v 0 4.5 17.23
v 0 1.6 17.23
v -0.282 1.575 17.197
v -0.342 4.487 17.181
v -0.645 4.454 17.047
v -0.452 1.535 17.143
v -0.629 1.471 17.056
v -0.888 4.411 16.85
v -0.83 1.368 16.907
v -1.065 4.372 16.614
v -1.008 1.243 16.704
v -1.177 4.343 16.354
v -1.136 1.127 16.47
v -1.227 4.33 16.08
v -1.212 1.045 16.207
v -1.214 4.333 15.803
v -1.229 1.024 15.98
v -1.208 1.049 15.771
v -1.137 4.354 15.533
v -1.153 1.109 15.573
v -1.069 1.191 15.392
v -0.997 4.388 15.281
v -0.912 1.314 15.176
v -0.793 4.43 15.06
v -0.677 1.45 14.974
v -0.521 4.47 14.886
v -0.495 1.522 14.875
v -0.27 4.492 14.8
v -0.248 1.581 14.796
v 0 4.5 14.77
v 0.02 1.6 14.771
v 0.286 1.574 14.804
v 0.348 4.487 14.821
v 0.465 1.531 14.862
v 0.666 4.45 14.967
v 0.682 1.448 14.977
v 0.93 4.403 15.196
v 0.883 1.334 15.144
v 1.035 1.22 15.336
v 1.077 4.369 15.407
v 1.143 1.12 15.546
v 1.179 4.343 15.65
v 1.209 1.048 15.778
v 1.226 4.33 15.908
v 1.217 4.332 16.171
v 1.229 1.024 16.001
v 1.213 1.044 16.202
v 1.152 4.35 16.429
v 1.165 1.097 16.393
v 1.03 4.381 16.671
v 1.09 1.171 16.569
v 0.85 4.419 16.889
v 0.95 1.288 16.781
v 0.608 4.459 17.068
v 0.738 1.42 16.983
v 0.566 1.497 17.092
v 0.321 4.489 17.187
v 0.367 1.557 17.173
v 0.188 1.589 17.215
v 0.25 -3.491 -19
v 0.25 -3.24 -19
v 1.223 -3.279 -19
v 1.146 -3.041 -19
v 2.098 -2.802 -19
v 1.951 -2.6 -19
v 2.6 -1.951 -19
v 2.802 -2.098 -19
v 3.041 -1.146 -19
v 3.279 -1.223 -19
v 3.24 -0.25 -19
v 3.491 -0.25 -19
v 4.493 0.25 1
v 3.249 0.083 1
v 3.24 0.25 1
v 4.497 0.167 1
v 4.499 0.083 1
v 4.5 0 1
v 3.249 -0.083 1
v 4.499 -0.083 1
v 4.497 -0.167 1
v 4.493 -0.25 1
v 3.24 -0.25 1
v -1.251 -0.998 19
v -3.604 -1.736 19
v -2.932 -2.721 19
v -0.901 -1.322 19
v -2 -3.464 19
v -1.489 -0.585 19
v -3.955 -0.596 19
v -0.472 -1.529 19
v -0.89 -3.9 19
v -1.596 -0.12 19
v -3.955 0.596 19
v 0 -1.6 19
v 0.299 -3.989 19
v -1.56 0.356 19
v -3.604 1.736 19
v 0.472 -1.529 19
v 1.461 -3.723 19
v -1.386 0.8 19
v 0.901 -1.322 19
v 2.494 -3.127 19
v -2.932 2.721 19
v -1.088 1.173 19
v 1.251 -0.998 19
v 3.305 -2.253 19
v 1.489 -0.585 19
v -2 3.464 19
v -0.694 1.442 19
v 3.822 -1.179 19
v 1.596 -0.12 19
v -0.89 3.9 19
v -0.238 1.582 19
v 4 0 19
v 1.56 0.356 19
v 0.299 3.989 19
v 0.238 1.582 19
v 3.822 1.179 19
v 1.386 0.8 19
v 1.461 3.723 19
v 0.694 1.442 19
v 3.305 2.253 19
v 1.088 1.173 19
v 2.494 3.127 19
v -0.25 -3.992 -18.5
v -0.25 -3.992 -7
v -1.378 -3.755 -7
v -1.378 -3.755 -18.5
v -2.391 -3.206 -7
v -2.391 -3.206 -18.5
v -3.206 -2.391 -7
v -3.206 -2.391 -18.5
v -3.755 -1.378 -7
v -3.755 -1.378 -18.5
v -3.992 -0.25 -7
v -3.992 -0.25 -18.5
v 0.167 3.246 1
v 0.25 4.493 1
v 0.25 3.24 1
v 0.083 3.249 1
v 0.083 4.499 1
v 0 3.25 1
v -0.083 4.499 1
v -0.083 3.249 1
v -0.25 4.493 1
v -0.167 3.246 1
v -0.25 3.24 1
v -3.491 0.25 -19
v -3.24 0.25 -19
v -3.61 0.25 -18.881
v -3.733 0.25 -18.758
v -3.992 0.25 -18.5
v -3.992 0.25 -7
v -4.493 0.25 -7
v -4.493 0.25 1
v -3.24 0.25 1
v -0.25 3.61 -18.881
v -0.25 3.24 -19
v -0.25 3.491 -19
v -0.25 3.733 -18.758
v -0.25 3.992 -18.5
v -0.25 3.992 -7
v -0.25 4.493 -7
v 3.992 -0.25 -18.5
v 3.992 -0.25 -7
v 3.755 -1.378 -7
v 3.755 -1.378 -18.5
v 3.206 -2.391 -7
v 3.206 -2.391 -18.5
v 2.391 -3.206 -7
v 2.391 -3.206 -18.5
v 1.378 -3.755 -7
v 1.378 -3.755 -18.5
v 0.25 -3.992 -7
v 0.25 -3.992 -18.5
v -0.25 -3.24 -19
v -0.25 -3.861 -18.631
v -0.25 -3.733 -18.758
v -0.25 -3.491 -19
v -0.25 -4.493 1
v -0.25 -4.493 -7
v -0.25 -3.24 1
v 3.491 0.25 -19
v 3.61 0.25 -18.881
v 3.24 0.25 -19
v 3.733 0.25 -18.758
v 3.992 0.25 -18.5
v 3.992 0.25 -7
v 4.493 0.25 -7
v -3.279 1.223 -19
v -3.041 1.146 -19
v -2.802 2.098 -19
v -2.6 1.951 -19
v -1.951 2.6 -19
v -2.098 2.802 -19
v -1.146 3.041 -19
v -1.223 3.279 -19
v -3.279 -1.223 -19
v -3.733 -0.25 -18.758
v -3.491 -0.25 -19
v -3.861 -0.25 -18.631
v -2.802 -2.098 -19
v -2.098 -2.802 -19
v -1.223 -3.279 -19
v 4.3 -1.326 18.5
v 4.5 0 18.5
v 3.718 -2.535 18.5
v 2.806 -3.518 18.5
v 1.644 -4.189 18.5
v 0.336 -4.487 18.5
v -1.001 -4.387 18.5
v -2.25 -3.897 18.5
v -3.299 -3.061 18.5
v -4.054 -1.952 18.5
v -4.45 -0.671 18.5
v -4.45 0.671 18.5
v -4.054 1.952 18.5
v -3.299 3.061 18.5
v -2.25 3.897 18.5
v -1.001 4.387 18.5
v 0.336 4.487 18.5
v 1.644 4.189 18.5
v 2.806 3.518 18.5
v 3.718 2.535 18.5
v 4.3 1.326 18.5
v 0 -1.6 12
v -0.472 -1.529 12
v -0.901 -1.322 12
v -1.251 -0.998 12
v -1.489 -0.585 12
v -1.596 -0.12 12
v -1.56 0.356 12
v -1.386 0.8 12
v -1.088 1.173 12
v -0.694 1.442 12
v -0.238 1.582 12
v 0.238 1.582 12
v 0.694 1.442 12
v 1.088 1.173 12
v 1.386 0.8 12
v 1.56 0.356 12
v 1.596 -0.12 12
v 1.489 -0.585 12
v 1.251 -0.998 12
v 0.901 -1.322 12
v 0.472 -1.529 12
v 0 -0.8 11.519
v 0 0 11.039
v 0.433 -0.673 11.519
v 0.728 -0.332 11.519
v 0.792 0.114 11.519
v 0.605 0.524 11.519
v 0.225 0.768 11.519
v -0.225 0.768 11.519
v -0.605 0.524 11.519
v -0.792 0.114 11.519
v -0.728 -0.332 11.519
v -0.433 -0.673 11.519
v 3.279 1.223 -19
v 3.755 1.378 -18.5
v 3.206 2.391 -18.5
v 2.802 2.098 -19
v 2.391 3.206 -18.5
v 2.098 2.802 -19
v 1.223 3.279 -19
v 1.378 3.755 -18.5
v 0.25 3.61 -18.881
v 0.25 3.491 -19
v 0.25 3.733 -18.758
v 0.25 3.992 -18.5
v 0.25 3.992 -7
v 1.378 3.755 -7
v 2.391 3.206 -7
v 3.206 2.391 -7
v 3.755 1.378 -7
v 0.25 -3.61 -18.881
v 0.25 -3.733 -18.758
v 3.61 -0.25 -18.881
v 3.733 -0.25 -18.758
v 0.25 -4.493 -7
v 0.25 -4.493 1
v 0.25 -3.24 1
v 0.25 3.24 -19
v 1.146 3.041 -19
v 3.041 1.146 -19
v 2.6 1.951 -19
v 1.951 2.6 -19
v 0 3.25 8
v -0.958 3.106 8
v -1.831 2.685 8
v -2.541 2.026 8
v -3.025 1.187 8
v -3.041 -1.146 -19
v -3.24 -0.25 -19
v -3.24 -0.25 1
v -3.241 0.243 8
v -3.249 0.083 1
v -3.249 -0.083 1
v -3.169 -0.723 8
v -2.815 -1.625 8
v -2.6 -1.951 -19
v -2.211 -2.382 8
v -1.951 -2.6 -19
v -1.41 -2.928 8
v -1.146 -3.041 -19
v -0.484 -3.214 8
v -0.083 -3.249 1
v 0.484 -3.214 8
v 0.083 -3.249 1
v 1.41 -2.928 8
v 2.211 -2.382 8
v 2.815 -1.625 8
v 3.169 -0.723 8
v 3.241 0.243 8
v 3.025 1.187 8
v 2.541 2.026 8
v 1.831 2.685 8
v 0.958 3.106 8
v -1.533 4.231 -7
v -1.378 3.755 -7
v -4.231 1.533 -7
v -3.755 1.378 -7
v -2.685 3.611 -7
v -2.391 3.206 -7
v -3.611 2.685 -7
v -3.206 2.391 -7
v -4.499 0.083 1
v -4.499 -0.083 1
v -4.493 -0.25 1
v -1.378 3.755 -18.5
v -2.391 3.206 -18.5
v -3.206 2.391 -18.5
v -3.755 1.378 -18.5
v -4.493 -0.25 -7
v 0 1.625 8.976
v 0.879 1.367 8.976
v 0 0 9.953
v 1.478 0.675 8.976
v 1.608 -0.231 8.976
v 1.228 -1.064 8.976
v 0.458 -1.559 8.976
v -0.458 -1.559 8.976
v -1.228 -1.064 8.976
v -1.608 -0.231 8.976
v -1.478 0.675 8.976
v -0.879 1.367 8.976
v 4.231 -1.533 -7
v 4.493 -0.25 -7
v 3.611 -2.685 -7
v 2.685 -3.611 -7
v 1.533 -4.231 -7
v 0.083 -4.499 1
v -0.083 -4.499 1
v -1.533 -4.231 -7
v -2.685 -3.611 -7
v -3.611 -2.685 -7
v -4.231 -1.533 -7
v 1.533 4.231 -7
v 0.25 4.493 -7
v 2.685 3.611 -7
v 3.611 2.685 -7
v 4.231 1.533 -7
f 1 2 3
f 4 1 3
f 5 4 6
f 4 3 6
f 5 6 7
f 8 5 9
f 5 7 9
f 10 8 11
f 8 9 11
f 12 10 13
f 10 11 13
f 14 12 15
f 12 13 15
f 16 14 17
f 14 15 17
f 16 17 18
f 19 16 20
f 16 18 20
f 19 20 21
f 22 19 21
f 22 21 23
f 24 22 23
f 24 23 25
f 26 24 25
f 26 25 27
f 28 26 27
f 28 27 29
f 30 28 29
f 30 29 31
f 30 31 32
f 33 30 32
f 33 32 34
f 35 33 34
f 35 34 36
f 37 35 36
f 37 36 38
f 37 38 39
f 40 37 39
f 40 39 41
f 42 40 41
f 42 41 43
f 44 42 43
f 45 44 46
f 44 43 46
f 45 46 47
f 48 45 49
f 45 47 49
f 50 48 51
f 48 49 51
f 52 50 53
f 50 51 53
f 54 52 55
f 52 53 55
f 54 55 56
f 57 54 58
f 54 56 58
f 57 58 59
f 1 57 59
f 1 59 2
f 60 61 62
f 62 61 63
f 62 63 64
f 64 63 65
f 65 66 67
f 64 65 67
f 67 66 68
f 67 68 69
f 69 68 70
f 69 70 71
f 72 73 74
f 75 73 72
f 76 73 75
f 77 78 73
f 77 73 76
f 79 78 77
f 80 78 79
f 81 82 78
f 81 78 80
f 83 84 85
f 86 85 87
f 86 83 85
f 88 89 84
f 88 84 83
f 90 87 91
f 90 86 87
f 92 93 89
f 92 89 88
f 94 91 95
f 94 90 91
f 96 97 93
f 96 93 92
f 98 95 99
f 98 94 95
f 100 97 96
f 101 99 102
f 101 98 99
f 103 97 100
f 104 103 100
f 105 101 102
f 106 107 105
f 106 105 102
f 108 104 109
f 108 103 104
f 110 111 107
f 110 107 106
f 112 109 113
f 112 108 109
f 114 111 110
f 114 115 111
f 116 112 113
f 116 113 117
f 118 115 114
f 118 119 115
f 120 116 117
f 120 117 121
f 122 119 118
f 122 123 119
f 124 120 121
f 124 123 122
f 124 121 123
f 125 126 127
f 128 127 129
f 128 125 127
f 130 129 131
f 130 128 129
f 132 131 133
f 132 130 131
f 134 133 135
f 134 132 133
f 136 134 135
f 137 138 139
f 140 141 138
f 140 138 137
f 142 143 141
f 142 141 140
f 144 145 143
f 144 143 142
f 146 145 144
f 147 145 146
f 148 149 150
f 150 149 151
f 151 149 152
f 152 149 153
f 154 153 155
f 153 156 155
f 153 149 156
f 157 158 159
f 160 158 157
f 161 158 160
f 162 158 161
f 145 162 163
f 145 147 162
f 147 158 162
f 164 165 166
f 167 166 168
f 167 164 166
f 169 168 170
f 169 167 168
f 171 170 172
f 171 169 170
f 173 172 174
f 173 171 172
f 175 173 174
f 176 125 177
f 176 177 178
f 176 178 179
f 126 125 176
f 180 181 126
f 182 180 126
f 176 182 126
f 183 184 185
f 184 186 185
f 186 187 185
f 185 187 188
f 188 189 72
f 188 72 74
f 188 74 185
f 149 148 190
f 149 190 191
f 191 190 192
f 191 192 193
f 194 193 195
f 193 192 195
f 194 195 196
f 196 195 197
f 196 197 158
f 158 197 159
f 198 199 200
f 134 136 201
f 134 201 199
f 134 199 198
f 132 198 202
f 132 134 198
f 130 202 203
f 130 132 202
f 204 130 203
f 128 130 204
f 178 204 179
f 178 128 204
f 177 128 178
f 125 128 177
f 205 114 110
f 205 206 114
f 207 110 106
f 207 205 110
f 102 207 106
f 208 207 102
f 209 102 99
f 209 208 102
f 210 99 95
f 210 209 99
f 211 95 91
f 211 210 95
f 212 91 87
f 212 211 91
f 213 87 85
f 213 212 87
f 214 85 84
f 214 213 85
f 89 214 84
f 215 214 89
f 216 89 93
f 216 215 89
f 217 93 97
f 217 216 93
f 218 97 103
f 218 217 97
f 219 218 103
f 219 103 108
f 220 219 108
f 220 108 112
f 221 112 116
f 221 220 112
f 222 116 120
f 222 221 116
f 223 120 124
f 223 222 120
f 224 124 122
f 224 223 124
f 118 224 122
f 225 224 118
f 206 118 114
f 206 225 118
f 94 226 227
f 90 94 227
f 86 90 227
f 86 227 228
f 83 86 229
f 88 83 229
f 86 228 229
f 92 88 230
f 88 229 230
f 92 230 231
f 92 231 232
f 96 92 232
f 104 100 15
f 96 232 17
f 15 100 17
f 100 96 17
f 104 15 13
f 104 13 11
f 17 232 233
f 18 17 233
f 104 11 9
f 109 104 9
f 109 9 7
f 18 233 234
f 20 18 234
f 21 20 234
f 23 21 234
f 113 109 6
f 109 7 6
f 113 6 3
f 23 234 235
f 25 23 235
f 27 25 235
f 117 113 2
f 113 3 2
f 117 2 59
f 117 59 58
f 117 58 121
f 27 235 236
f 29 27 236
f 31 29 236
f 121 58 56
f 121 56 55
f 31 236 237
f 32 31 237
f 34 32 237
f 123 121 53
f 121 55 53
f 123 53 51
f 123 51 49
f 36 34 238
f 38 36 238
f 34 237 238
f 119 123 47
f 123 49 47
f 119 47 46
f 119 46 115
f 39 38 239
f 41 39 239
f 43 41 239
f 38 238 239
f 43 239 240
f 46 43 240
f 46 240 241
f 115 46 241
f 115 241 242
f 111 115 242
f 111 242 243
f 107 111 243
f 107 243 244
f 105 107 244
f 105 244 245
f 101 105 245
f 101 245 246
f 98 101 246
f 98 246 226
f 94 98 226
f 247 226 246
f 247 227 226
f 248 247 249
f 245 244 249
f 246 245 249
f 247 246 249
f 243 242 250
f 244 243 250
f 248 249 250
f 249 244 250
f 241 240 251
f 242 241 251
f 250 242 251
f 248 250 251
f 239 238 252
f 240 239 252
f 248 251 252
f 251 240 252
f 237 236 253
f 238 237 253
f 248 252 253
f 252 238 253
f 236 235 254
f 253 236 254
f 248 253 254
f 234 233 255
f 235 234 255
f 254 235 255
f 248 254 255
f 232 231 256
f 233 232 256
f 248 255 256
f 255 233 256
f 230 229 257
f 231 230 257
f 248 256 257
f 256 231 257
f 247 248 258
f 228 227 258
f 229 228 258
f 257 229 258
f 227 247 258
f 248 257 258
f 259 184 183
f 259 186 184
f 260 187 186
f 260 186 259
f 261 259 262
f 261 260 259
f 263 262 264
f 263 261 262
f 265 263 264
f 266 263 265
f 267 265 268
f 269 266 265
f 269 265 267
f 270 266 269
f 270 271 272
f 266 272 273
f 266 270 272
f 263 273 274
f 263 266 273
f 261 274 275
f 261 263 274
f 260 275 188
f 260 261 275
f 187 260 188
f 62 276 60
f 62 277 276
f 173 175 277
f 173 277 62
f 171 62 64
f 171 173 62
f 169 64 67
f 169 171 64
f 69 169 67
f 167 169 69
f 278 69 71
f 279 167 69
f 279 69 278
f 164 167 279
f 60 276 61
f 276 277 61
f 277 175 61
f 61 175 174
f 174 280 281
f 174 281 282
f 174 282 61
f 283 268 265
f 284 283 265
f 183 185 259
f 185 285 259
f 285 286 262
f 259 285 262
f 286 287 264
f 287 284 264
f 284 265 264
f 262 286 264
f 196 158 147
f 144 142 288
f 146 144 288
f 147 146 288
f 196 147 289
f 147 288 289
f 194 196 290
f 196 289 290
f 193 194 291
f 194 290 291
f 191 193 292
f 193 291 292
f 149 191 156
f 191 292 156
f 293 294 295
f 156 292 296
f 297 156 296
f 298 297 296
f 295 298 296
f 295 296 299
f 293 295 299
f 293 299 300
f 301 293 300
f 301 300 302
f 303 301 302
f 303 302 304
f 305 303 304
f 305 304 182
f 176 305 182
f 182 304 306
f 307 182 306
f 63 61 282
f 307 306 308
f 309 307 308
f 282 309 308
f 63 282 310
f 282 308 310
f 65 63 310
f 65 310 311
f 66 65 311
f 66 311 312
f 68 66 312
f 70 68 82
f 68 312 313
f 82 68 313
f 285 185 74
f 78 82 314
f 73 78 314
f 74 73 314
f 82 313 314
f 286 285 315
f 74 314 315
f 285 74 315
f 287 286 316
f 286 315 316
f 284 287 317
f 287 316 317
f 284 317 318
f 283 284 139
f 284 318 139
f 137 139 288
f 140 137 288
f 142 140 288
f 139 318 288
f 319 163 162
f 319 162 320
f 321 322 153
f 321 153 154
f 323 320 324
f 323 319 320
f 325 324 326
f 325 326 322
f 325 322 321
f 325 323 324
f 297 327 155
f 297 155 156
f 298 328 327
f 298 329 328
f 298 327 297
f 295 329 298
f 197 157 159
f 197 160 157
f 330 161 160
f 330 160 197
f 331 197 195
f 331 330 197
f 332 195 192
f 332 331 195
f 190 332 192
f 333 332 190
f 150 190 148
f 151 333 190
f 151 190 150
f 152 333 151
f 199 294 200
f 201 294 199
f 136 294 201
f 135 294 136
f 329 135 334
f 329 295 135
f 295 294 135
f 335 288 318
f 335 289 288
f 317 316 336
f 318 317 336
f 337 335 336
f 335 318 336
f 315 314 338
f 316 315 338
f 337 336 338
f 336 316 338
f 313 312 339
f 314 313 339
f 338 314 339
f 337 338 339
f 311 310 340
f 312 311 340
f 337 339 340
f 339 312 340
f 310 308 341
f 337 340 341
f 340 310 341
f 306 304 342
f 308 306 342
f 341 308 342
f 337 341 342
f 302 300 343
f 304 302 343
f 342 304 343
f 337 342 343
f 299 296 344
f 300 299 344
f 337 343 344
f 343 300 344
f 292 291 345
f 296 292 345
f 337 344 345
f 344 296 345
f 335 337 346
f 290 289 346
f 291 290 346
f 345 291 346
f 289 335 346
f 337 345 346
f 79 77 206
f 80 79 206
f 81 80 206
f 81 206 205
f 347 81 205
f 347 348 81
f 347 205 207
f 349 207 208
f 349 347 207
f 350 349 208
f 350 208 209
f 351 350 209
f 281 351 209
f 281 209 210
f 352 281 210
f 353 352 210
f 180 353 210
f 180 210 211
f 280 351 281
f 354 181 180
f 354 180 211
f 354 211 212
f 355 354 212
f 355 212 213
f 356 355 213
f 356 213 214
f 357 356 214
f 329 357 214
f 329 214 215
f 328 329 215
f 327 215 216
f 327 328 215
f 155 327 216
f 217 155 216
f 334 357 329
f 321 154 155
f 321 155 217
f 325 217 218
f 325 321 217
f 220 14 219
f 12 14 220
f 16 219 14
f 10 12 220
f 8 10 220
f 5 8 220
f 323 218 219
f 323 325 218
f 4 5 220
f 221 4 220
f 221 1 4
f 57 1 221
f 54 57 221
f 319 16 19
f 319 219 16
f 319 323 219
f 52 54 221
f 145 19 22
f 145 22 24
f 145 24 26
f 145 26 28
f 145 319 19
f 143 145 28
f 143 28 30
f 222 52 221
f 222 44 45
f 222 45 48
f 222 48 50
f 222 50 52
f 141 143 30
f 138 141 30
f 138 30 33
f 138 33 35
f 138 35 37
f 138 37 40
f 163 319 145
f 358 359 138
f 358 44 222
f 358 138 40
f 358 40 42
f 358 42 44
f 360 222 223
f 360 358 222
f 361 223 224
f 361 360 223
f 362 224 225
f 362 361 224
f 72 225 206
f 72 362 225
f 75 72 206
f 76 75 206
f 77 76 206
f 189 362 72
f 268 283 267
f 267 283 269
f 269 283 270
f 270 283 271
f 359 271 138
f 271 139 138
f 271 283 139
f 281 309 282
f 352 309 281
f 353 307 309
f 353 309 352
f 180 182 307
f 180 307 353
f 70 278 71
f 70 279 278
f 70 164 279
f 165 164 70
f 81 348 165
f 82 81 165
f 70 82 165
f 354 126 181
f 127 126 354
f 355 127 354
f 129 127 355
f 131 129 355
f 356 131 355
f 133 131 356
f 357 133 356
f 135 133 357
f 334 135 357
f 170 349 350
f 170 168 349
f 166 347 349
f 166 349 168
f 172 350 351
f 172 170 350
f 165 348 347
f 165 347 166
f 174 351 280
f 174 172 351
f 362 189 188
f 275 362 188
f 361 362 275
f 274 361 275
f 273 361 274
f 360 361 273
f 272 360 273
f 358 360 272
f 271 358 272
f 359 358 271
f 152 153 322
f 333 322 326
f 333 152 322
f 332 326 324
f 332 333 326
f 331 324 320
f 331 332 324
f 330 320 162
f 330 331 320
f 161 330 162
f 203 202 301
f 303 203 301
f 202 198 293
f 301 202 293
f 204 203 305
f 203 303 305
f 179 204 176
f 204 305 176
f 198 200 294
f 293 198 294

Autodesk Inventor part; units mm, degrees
ref_plane "YZ Plane" through (0, 0, 0) normal (1, 0, 0) x (0, 1, 0)
ref_plane "XY Plane" through (0, 0, 0) normal (0, 0, 1) x (1, 0, 0)
sketch "Esboço1" plane through (0, 0, 0) normal (0, 0, 1) x (1, 0, 0)
  circle A0 centre (0, 0) radius 4.5
  dimension "d0" = 9
extrude "Extrusão1" add sketch "Esboço1" along normal mid plane 38
sketch "Esboço2" plane through (0, 0, 19) normal (0, 0, 1) x (1, 0, 0)
  point P0 (0, 0)
  point P1 (0, 0)
hole "Furo1" at (0, 0, 19) direction (0, 0, -1) diameter 3.2 depth 7 tip angle 118
sketch "Esboço3" plane through (0, 0, -19) normal (0, 0, -1) x (-1, 0, 0)
  point P0 (0, 0)
  point P1 (0, 0)
hole "Furo2" at (0, 0, -19) direction (0, 0, 1) diameter 6.5 depth 27 tip angle 118
sketch "Esboço4" plane through (0, 0, -19) normal (0, 0, -1) x (-1, 0, 0)
  circle A0 centre (0, 0) radius 4.5 projected
  circle A1 centre (0, 0) radius 4
  dimension "d18" = 8
extrude "Extrusão2" cut sketch "Esboço4" against normal blind 12
sketch "Esboço5" plane through (0, 0, 0) normal (1, 0, 0) x (0, 1, 0)
  line L0 (4.5, -7) -> (4.5, 19) projected
  line L1 (4.5, 1) -> (-4.5, 1)
  line L2 (-4.5, 1) -> (-4.5, -19)
  line L3 (4.5, -19) -> (4.5, 1)
  line L4 (-4.5, -7) -> (-4.5, 19) projected
  line L5 (-4, -19) -> (4, -19) projected
  line L6 (4, -19) -> (4, -7) projected
  line L7 (4.5, -19) -> (-4.5, -19)
  point P0 (0, 0)
  dimension "d23" = 20
extrude "Extrusão3" cut sketch "Esboço5" along normal mid plane 0.5
sketch "Esboço6" plane through (0, 0, 0) normal (0, 1, 0) x (-1, 0, 0)
  line L0 (-4.5, -7) -> (-4.5, 19) projected
  line L1 (4.5, -7) -> (4.5, 19) projected
  line L2 (-0.25, 1) -> (0.25, 1)
  line L3 (-4.5, -19) -> (4.5, -19)
  line L4 (4.5, -19) -> (4.5, 1)
  line L5 (4.5, 1) -> (-4.5, 1)
  line L6 (-4.5, 1) -> (-4.5, -19)
  line L7 (-4, -19) -> (-0.25, -19) projected
  line L8 (0.25, -19) -> (4, -19) projected
  line L9 (0.25, 1) -> (-0.25, 1) projected
  point P0 (0, 0)
extrude "Extrusão4" cut sketch "Esboço6" along normal mid plane 0.5
ref_plane "Plano de trabalho1" through (0, 4.5, 0) normal (0, 1, 0) x (-1, 0, 0)
sketch "Esboço7" plane through (0, 4.5, 0) normal (0, 1, 0) x (-1, 0, 0)
  line L0 (-1.6, 19) -> (1.6, 19) projected
  line L1 (0, 19) -> (0, 16) construction
  point P0 (0, 0)
  dimension "d28" = 3
hole "Furo3" at (0, 4.5, 16) direction (0, -1, 0) diameter 2.459 end up to surface thread size "M3x0.5" class "6H" standard "ANSI Metric M Profile"
chamfer "Chanfro1" distance 0.5 angle 45 5 edges at (-4.5, 0, 19) (-2.8284, 2.8284, -19) (-2.8284, -2.8284, -19) (2.8284, -2.8284, -19) (2.8284, 2.8284, -19)
properties part number "N4049_pino_contato_T"
